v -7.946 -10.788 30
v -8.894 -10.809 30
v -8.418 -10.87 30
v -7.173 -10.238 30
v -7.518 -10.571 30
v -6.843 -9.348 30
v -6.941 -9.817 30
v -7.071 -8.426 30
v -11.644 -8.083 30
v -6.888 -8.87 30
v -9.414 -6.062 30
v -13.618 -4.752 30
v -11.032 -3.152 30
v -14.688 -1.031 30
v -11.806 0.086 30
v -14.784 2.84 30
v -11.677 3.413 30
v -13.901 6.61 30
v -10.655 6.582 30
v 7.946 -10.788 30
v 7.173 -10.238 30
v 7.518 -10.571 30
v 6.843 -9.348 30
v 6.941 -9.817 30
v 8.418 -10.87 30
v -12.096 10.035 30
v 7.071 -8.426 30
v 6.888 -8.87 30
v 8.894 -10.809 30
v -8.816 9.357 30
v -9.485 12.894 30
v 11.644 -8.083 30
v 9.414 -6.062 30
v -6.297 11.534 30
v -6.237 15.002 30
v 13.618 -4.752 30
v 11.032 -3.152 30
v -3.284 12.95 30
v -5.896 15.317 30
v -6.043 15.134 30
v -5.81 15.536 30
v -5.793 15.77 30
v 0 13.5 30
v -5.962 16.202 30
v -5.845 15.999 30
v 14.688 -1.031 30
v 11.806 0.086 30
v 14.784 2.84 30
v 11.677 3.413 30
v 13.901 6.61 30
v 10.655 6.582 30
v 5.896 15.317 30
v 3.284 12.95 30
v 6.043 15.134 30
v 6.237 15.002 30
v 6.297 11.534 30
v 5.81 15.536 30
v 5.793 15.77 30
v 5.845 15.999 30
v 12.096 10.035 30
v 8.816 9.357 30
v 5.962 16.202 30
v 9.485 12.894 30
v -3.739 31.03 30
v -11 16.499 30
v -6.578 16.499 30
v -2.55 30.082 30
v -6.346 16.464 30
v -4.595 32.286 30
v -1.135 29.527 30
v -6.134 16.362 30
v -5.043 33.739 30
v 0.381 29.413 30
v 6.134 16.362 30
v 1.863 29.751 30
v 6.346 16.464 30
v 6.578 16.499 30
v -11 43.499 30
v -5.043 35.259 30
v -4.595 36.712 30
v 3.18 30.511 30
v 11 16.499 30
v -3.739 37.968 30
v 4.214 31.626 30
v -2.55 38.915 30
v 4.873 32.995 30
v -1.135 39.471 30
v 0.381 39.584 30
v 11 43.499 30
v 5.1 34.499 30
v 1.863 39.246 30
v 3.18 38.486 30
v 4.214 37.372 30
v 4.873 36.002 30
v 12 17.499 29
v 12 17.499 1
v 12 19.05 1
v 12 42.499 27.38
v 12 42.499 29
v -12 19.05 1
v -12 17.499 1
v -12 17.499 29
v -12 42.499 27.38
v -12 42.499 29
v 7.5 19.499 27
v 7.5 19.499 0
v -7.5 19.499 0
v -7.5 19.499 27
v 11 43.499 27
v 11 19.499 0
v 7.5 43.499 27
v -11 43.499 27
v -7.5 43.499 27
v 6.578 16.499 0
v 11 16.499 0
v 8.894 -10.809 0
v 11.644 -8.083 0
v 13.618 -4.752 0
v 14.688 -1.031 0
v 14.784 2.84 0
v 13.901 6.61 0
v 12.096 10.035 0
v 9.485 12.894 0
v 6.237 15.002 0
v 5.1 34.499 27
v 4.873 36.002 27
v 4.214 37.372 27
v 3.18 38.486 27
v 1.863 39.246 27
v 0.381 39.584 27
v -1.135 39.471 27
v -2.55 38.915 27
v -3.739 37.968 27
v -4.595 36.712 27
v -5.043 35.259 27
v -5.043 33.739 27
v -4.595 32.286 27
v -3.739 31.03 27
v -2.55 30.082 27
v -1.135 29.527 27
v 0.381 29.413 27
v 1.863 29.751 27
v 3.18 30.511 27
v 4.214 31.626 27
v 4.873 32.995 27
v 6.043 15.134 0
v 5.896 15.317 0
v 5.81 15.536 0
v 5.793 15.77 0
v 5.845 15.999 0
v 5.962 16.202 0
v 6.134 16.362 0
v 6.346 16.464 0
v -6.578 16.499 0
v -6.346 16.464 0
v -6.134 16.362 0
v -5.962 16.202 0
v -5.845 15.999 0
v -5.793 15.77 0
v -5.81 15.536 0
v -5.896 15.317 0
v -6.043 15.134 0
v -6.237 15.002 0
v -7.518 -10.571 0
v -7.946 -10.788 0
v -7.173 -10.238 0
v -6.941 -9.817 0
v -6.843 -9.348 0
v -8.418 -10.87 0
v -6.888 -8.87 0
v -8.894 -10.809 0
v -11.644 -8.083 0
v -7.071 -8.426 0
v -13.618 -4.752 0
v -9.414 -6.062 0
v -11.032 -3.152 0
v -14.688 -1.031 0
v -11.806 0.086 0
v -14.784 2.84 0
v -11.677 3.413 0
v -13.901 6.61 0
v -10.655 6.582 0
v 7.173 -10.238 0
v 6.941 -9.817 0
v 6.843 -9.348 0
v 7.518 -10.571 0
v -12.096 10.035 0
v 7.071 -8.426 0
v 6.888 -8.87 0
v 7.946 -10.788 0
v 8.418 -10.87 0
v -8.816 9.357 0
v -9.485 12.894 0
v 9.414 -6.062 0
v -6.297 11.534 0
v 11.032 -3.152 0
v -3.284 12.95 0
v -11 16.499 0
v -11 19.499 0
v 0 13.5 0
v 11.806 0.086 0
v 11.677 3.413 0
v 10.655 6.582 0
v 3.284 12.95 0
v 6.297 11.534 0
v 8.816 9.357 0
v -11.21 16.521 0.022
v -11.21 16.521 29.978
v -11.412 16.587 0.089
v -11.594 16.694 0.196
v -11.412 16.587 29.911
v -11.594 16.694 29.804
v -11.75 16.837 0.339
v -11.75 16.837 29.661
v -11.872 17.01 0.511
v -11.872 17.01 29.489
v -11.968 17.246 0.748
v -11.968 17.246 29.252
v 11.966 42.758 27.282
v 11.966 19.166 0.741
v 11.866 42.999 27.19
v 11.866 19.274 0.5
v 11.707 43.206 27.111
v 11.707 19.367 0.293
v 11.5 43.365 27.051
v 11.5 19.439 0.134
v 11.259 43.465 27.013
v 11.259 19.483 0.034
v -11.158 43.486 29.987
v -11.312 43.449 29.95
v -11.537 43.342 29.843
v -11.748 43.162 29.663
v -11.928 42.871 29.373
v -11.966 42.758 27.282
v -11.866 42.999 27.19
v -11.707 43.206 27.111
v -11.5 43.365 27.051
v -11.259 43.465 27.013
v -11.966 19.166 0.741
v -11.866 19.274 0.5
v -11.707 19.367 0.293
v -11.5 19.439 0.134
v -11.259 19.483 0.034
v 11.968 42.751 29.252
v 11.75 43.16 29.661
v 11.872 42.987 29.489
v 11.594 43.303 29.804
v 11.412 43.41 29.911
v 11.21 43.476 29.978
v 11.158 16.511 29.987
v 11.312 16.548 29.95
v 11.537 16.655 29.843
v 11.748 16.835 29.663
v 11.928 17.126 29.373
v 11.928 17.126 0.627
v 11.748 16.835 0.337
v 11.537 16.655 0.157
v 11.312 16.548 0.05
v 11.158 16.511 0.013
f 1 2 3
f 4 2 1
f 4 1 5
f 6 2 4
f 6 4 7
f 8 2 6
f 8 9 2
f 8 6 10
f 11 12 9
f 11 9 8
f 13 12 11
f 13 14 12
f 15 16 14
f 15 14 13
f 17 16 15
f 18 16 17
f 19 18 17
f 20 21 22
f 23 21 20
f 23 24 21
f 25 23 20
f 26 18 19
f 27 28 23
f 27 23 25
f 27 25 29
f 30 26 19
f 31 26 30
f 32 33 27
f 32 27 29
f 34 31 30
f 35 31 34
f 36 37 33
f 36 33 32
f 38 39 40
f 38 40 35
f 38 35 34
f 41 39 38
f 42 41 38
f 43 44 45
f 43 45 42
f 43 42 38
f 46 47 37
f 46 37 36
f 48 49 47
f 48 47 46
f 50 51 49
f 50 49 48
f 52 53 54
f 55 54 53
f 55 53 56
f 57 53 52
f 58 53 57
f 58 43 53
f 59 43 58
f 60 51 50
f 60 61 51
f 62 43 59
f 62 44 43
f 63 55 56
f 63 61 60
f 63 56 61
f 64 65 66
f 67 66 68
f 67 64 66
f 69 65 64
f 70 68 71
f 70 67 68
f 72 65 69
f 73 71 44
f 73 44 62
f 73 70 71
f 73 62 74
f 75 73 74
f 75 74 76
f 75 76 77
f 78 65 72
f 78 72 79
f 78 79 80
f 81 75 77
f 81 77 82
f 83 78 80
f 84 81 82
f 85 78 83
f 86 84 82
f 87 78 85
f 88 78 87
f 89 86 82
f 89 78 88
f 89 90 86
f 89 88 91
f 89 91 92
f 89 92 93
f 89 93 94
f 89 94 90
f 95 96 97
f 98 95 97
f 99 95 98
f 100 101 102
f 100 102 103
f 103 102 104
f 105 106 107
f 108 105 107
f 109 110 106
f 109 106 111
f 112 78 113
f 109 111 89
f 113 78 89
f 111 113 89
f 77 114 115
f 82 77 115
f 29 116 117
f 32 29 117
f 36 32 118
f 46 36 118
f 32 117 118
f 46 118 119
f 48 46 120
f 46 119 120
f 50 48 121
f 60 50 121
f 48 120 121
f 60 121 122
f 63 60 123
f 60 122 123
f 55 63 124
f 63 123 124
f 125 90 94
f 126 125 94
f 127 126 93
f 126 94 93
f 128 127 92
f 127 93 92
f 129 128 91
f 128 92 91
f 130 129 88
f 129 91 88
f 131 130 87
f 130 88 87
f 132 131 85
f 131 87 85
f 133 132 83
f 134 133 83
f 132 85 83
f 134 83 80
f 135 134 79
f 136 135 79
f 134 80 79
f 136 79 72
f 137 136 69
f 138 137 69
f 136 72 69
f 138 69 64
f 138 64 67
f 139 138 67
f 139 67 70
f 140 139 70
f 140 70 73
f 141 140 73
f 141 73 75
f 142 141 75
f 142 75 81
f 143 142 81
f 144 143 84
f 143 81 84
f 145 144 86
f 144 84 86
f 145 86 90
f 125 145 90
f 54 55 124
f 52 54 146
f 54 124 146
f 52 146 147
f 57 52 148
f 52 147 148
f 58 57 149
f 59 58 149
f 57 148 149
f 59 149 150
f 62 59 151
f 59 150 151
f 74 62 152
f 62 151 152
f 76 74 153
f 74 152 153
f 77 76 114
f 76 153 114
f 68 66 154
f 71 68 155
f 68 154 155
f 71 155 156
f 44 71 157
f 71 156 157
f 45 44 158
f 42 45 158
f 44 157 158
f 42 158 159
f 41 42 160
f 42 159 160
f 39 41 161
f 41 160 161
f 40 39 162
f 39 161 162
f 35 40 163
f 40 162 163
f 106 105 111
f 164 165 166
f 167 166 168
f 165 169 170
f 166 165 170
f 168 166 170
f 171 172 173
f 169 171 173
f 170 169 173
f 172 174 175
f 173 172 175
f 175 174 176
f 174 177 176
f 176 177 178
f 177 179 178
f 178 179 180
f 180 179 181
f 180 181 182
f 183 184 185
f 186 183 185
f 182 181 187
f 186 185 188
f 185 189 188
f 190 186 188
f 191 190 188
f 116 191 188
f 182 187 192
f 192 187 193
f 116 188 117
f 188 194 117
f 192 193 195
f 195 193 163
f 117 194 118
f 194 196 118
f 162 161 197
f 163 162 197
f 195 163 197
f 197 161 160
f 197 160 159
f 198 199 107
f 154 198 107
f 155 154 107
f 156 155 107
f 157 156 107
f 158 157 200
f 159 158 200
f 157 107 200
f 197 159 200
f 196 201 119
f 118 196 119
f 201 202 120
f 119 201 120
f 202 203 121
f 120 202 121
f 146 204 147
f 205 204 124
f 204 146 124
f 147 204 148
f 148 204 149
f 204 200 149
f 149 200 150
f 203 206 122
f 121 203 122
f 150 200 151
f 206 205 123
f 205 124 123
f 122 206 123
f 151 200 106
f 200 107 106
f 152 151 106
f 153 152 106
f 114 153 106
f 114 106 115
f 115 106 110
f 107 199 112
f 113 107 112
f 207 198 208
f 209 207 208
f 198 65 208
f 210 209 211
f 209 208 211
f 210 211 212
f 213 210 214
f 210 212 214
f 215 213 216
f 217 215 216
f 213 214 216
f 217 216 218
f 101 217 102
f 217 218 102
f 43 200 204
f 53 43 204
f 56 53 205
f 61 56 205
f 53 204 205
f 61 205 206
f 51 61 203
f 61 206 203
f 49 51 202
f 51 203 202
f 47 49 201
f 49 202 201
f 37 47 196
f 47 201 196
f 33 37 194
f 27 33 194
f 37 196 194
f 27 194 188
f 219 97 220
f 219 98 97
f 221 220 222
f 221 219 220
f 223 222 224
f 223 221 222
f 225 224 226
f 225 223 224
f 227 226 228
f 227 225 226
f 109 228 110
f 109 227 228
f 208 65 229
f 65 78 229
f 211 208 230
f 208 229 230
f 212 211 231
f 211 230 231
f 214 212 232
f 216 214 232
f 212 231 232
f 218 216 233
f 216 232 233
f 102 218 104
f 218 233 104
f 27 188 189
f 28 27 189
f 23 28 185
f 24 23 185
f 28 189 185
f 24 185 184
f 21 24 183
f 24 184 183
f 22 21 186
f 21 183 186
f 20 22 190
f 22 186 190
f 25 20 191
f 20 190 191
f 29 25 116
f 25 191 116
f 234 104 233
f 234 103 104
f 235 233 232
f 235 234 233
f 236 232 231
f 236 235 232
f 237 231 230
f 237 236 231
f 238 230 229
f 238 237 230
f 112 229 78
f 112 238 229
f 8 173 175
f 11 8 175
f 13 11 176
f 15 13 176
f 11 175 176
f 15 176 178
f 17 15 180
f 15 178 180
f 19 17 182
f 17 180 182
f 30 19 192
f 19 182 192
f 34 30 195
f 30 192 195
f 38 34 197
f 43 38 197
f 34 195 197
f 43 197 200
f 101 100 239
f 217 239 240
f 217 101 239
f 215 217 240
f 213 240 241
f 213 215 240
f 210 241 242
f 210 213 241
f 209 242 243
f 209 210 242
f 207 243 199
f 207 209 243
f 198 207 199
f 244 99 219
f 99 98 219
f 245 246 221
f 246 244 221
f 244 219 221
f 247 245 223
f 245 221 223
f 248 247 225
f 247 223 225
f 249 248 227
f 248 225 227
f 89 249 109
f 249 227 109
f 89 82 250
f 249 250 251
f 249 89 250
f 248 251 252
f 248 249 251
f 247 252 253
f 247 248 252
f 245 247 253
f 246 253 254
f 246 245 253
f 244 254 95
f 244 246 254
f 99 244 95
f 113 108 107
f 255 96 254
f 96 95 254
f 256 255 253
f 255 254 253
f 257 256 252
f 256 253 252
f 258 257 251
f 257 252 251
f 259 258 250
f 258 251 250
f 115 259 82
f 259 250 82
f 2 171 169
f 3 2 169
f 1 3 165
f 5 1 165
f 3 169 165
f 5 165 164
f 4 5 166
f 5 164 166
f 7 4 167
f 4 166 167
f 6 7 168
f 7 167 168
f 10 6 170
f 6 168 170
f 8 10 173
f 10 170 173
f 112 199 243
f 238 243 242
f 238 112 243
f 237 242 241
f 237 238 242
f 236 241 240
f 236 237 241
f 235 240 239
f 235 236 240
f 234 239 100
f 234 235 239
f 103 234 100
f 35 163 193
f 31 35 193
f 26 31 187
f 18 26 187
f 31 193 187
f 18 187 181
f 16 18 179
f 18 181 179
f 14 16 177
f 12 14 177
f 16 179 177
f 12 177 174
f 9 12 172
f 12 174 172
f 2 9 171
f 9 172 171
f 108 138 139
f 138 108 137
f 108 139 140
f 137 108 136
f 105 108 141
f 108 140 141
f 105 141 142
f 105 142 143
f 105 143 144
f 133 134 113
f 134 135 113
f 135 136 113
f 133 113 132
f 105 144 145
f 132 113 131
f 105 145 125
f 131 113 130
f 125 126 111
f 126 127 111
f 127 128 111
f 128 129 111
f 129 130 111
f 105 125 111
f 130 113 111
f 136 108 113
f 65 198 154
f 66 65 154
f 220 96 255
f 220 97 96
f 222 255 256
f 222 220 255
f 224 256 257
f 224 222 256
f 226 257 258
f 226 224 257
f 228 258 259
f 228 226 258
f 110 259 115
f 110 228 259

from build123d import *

# Parameters (mm, degrees)
F1_DEPTH = 30
F2_W     = 24
F2_H     = 24
F2_R     = 5.1
F3_DEPTH = 3
F6_DEPTH = 4.5
F8_R     = 1


with BuildPart() as f1:
    # F0 (on Top) → F1 (new body)
    with BuildSketch(Plane.XY):
        with BuildLine():
            ThreePointArc((0, 13.5), (11.2743427126, 5.0323645735), (7.0706637066, -8.4264888743))
            ThreePointArc((7.0706637066, -8.4264888743), (7.1725693465, -10.2375673256), (8.8942921325, -10.8085844568))
            ThreePointArc((8.8942921325, -10.8085844568), (14.7842599605, 2.839809495), (6.2367777531, 15.0016731019))
            ThreePointArc((6.2367777531, 15.0016731019), (5.8102691618, 15.8862752393), (6.5779752006, 16.4986949957))
            Line((6.5779752006, 16.4986949957), (12, 16.4986949957))
            Line((12, 16.4986949957), (12, 19.4986949957))
            Line((12, 19.4986949957), (-12, 19.4986949957))
            Line((-12, 19.4986949957), (-12, 16.4986949957))
            Line((-12, 16.4986949957), (-6.5779752006, 16.4986949957))
            ThreePointArc((-6.5779752006, 16.4986949957), (-5.8102691618, 15.8862752393), (-6.2367777531, 15.0016731019))
            ThreePointArc((-6.2367777531, 15.0016731019), (-14.7842599605, 2.839809495), (-8.8942921325, -10.8085844568))
            ThreePointArc((-8.8942921325, -10.8085844568), (-7.1725693465, -10.2375673256), (-7.0706637066, -8.4264888743))
            ThreePointArc((-7.0706637066, -8.4264888743), (-11.2743427126, 5.0323645735), (0, 13.5))
        make_face()
    extrude(amount=F1_DEPTH)

    # F2 (on face) → F3 (join)
    with BuildSketch(Plane.XY.offset(30)):
        with Locations((0, 31.4986949957)):
            Rectangle(F2_W, F2_H)
        with Locations((0, 34.4986949957)):
            Circle(F2_R, mode=Mode.SUBTRACT)
    extrude(amount=-F3_DEPTH)

    # F4: union 

    # F5 (on face) → F6 (join)
    with BuildSketch(Plane.YZ.offset(12)):
        Polygon((19.4986949957, 27), (19.4986949957, 0), (43.4986949957, 27), align=None)
    extrude(amount=-F6_DEPTH)

    # F7: F1 across plane


with BuildPart() as f1_1:
    add(f1.part)
    add(f1.part.mirror(Plane.YZ))

    # F8
    f8_edges = [f1_1.edges().sort_by_distance(p)[0] for p in [
        (12, 17.998695, 0),
        (12, 16.498695, 15),
        (12, 29.998695, 30),
        (12, 43.498695, 28.5),
        (12, 31.498695, 13.5),
        (-12, 43.498695, 28.5),
        (-12, 29.998695, 30),
        (-12, 16.498695, 15),
        (-12, 17.998695, 0),
        (-12, 31.498695, 13.5),
    ]]
    fillet(f8_edges, radius=F8_R)


solid = f1_1.part
